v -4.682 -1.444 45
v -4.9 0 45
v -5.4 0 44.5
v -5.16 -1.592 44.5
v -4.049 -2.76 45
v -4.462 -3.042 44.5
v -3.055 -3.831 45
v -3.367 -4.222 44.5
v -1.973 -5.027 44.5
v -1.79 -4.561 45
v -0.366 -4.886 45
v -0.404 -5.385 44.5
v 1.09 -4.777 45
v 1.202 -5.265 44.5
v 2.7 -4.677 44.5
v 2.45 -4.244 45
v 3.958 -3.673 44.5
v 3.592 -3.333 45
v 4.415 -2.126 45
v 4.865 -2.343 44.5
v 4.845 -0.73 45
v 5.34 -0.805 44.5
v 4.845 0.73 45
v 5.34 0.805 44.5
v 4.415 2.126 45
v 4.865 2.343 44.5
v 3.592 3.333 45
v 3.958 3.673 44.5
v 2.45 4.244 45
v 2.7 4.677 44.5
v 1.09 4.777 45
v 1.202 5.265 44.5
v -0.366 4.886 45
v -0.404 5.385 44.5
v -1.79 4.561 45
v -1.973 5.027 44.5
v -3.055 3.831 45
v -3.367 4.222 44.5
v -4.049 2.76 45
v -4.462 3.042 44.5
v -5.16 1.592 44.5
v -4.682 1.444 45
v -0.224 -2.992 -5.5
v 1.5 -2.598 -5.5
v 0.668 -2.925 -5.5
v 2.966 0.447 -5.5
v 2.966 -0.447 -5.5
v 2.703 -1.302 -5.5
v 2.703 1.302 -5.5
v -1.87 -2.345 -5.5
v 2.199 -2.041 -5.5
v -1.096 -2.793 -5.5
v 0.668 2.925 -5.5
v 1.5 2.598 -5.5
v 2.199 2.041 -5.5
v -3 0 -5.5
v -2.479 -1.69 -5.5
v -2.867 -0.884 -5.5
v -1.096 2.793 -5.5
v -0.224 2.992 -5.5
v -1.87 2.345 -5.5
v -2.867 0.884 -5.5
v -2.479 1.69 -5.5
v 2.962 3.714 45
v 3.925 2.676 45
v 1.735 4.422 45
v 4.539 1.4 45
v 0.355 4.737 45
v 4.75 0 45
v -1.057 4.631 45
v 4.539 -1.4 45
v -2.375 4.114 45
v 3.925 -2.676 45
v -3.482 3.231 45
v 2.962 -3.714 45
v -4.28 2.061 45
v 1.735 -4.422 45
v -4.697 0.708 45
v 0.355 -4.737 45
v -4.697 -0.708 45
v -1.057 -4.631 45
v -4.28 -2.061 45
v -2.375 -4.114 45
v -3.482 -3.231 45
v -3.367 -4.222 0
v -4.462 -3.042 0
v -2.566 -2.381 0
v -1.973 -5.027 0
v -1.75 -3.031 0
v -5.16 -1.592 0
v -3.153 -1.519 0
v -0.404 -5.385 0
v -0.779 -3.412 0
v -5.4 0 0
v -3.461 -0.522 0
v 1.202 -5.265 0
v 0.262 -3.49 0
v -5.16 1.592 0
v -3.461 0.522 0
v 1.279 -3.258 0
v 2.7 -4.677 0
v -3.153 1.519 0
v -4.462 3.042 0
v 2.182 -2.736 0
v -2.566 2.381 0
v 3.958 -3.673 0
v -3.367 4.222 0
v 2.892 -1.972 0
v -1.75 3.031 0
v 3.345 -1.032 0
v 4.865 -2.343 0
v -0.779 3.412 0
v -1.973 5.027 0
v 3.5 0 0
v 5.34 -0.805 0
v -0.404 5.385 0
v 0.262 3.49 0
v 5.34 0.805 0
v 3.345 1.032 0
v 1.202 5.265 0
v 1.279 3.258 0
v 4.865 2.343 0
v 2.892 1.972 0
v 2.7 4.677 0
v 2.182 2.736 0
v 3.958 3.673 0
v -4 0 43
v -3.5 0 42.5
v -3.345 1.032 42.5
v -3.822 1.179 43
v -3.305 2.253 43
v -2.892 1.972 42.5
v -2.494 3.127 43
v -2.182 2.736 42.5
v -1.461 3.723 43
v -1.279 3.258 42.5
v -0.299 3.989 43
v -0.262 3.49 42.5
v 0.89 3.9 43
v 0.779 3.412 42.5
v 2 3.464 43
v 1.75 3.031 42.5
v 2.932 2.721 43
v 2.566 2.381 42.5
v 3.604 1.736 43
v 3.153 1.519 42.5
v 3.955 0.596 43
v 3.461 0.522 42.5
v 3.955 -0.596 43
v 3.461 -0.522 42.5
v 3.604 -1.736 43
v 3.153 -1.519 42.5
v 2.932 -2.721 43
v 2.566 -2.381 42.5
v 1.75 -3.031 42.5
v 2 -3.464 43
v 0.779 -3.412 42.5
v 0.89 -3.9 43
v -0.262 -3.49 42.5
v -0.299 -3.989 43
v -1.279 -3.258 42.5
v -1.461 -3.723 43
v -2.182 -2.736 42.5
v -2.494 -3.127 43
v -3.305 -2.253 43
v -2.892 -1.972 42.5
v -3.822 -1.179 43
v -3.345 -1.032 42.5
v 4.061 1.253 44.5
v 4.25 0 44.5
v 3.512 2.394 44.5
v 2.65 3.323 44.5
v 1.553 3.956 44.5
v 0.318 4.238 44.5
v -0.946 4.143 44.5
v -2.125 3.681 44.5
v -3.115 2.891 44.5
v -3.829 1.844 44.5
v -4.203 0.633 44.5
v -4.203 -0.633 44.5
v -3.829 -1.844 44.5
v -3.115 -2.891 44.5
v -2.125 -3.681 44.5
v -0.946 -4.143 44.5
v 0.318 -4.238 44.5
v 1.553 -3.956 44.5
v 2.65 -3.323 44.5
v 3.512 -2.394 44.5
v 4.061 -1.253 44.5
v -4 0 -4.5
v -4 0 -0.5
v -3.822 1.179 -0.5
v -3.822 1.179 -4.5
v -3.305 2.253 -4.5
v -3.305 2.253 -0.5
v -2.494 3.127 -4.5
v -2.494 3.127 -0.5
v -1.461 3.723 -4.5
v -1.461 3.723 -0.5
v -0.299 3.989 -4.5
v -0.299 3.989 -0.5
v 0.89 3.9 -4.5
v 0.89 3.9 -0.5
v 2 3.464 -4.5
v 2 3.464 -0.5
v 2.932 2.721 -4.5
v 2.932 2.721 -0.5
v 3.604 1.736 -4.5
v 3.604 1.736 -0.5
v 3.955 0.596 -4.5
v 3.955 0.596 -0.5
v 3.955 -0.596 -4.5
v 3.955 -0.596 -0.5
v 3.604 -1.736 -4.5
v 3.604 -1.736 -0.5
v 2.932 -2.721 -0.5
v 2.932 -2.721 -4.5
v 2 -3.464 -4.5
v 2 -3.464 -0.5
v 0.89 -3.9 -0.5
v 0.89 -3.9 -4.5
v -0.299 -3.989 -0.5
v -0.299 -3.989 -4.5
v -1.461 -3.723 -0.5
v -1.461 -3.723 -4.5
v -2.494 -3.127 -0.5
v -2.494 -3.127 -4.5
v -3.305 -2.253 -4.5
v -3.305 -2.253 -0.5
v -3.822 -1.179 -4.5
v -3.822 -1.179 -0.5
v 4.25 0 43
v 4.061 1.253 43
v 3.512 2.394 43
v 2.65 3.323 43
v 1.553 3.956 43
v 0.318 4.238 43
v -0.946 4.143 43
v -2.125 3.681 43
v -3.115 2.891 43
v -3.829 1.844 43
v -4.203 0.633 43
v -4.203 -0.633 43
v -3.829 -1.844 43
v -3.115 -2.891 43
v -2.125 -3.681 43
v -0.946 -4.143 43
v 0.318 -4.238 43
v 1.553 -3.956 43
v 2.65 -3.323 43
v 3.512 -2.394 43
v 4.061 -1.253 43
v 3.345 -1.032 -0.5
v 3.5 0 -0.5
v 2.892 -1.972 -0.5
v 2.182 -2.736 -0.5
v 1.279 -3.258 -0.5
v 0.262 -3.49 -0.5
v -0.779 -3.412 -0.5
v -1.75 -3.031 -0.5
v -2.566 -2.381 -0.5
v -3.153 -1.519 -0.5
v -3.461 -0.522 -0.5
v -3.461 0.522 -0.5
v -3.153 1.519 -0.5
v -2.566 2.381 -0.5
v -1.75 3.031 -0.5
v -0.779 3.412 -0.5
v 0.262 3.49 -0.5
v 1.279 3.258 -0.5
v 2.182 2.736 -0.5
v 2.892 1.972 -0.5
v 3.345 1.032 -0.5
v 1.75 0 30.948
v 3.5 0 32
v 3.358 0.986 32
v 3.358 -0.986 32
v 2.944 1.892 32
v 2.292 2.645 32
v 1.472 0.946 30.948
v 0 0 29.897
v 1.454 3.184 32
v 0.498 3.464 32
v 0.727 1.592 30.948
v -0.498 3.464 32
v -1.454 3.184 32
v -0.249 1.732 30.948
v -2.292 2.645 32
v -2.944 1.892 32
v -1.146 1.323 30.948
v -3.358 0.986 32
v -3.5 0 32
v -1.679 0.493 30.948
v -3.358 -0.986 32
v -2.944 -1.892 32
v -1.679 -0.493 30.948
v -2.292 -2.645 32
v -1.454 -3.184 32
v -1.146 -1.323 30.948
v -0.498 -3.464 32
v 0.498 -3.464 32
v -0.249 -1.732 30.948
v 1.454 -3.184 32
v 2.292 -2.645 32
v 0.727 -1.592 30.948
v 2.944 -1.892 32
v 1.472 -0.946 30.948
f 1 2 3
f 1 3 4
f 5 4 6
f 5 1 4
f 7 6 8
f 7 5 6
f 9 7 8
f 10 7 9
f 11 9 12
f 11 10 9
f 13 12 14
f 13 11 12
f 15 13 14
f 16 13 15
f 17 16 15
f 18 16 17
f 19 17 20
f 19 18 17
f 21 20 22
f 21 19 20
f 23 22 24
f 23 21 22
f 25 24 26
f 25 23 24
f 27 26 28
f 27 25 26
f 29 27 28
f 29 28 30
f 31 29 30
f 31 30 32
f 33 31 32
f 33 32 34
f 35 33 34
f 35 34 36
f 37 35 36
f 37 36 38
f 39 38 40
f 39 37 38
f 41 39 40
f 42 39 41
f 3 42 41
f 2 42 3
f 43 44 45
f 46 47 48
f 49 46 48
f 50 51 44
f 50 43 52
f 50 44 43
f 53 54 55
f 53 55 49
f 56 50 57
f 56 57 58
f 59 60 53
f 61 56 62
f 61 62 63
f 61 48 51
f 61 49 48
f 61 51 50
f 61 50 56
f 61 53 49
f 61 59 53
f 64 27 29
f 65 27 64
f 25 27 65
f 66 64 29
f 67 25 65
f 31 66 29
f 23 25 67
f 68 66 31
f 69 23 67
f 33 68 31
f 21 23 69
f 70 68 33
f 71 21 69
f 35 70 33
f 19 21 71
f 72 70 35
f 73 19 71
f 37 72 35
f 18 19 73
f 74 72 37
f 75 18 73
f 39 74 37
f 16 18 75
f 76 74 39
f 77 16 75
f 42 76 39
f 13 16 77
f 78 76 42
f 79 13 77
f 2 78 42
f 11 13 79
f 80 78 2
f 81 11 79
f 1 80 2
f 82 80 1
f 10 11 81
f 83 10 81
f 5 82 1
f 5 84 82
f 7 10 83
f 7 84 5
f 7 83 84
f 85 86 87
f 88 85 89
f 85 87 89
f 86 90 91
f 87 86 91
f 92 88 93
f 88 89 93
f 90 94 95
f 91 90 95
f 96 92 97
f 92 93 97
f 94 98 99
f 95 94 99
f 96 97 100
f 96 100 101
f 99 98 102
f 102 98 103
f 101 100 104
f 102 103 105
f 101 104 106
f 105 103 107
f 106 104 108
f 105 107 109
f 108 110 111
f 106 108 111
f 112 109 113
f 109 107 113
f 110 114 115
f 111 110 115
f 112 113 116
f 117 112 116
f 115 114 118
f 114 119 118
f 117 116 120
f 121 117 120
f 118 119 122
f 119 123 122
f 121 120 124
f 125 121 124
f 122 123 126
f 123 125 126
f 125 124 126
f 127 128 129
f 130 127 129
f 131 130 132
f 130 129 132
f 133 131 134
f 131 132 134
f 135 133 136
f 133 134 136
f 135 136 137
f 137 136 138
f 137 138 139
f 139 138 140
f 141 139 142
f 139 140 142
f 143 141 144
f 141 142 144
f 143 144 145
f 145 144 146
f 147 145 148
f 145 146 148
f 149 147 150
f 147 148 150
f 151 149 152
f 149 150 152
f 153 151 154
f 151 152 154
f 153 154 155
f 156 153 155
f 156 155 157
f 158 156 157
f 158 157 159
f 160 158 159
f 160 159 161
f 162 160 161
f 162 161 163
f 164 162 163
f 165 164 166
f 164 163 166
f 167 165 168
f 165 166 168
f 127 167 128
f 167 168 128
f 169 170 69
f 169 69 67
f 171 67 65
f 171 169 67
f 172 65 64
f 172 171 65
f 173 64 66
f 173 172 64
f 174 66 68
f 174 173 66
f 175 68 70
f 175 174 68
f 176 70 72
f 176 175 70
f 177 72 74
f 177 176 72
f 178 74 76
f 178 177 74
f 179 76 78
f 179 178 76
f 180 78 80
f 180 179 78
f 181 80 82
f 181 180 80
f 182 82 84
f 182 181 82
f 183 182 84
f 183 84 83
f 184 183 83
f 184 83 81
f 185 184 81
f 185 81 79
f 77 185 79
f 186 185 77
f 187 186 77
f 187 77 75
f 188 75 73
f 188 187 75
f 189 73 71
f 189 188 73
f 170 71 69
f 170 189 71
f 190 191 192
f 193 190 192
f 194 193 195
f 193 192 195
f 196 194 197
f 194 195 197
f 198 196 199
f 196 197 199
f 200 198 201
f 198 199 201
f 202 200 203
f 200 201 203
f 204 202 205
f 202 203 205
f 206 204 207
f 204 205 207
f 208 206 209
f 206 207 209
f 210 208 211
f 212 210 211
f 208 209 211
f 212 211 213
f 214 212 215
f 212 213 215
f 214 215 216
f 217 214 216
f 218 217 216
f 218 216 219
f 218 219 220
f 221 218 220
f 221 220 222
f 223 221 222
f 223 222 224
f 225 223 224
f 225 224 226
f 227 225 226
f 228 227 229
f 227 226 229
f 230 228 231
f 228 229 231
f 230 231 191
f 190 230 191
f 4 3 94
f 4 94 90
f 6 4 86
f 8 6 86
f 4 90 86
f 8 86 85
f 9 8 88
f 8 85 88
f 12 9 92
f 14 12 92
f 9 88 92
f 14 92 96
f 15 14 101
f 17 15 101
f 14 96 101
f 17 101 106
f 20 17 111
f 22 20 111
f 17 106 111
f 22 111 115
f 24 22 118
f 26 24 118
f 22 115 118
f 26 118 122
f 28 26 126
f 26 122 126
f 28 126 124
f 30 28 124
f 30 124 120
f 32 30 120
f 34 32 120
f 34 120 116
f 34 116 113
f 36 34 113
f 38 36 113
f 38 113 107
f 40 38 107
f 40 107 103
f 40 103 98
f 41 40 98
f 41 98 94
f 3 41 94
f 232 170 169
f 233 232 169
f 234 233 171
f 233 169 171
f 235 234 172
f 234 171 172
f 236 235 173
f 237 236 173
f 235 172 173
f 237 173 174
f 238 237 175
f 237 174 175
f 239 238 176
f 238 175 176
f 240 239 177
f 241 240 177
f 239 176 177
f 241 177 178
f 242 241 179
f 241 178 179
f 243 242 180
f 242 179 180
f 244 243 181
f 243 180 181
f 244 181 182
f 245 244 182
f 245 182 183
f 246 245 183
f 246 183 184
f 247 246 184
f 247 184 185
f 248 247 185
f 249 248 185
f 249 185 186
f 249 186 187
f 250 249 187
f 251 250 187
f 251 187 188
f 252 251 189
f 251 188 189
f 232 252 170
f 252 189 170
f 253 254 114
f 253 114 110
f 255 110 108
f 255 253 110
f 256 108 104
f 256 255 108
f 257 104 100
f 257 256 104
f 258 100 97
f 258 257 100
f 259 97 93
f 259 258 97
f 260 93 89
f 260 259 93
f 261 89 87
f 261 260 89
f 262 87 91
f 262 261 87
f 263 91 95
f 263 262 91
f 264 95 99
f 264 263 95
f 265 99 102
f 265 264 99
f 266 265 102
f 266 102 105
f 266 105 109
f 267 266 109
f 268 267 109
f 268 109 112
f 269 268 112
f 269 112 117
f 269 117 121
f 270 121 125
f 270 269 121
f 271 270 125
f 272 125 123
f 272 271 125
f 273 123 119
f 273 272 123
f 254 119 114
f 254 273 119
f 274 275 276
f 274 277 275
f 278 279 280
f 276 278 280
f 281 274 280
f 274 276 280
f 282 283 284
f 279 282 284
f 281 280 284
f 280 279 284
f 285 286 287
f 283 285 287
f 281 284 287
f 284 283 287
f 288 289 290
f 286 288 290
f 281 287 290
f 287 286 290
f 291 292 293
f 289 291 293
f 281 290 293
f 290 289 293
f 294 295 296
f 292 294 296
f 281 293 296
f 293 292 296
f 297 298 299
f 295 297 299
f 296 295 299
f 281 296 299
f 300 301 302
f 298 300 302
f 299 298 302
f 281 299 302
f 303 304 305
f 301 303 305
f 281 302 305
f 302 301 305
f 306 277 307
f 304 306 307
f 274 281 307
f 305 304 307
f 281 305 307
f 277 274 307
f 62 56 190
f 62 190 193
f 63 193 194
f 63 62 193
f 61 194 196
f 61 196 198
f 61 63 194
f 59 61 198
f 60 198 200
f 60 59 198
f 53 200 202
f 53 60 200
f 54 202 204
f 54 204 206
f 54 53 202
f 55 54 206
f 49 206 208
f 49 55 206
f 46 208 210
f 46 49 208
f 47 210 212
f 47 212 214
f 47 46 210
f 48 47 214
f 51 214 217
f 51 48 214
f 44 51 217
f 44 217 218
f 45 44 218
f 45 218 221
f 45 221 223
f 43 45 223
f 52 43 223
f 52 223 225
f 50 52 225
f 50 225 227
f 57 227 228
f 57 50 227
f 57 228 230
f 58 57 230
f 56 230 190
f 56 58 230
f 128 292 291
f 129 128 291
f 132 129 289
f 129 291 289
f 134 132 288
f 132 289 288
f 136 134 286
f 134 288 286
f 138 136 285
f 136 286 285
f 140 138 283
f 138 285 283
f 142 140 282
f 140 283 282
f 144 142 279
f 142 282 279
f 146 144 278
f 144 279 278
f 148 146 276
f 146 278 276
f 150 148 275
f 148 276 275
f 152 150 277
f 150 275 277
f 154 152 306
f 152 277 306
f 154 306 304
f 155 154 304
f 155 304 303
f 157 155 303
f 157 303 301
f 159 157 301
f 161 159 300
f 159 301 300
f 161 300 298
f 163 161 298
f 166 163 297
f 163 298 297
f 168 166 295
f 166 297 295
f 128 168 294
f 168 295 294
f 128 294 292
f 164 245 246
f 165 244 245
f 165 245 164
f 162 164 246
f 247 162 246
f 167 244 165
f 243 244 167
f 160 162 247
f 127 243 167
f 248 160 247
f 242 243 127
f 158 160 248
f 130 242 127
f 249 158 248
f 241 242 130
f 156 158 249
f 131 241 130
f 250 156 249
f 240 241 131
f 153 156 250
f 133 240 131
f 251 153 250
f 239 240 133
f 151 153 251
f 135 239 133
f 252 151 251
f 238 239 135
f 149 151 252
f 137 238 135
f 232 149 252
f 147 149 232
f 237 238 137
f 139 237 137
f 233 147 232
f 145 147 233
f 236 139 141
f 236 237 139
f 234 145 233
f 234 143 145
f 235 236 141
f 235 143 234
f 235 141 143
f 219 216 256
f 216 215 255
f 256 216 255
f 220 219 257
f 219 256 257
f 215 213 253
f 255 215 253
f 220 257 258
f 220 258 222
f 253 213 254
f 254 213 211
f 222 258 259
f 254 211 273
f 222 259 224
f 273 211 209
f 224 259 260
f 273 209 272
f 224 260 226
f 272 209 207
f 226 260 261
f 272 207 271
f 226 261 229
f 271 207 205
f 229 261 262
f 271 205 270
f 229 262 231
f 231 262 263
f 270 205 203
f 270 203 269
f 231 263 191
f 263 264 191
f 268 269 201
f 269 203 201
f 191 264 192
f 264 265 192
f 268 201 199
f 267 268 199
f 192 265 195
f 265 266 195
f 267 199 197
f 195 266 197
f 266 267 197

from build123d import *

# Parameters (mm, degrees)
SKETCH_1_R                = 5.4
EXTRUDE_1_DEPTH           = 45
EXTRUDE_3_DEPTH           = 5.4
M8X1_0_TAPPED_HOLE1_D     = 7
M8X1_0_TAPPED_HOLE1_DEPTH = 13
M8X1_0_TAPPED_HOLE1_TIP   = 2.103012167
M3_TAPPED_HOLE1_D         = 2.5
M3_TAPPED_HOLE1_DEPTH     = 7.5
M3_TAPPED_HOLE1_TIP       = 0.751075774
CHAMFER_1_SIZE            = 0.5
CHAMFER_2_SIZE            = 0.5
SKETCH_9_R                = 4.25
CUT_EXTRUDE_5_DEPTH       = 2
CHAMFER_3_SIZE            = 0.5
SKETCH_10_W               = 90.830281396
SKETCH_10_H               = 34.560289278
CUT_EXTRUDE_1_DEPTH       = 85
EXTRUDE_START             = 0.5
SKETCH_11_R               = 3.5
EXTRUDE_1_2_DEPTH         = 0.5
SKETCH_12_R               = 4
EXTRUDE_2_DEPTH           = 5
CHAMFER_4_SIZE            = 1


with BuildPart() as part:
    # 草图1 → Extrude 1 (new body)
    with BuildSketch(Plane.XY):
        with Locations(Location((0, 0, 0), (0, 0, 180))):
            Circle(SKETCH_1_R)
    extrude(amount=EXTRUDE_1_DEPTH)

    # 草图4 → 拉伸3 (add, symmetric)
    with BuildSketch(Plane.XZ):
        with BuildLine():
            Line((-22, 0), (22, 0))
            Line((22, 0), (28, -15.05119142))
            ThreePointArc((28, -15.05119142), (0, -12), (-28, -15.05119142))
            Line((-28, -15.05119142), (-22, 0))
        make_face()
    extrude(amount=EXTRUDE_3_DEPTH, both=True)

    # M8x1.0 Tapped Hole1
    with Locations(Plane.XY.offset(45)):
        with Locations((0, 0)):
            Hole(M8X1_0_TAPPED_HOLE1_D / 2, depth=M8X1_0_TAPPED_HOLE1_DEPTH)
            with Locations((0, 0, -(M8X1_0_TAPPED_HOLE1_DEPTH + M8X1_0_TAPPED_HOLE1_TIP / 2))):  # 118° drill point
                Cone(0, M8X1_0_TAPPED_HOLE1_D / 2, M8X1_0_TAPPED_HOLE1_TIP, mode=Mode.SUBTRACT)

    # M3 Tapped Hole1
    with Locations(Plane(origin=(-19.5, -1.4, 0), x_dir=(0, 1, 0), z_dir=(0, 0, 1))):
        with Locations((0, 0), (0, -39)):
            Hole(M3_TAPPED_HOLE1_D / 2, depth=M3_TAPPED_HOLE1_DEPTH)
            with Locations((0, 0, -(M3_TAPPED_HOLE1_DEPTH + M3_TAPPED_HOLE1_TIP / 2))):  # 118° drill point
                Cone(0, M3_TAPPED_HOLE1_D / 2, M3_TAPPED_HOLE1_TIP, mode=Mode.SUBTRACT)

    # 倒角1
    chamfer_1_edges = [part.edges().sort_by_distance(p)[0] for p in [
        (19.5, -0.15, 0),
        (-19.5, -0.15, 0),
    ]]
    chamfer(chamfer_1_edges, length=CHAMFER_1_SIZE)

    # 倒角2
    chamfer_2_edges = [part.edges().sort_by_distance(p)[0] for p in [
        (5.4, 0, 45),
    ]]
    chamfer(chamfer_2_edges, length=CHAMFER_2_SIZE)

    # 草图9 → 拉伸5 (cut)
    with BuildSketch(Plane.XY.offset(45)):
        Circle(SKETCH_9_R)
    extrude(amount=-CUT_EXTRUDE_5_DEPTH, mode=Mode.SUBTRACT)

    # 倒角3
    chamfer_3_edges = [part.edges().sort_by_distance(p)[0] for p in [
        (-4.25, 0, 45),
        (3.5, 0, 43),
    ]]
    chamfer(chamfer_3_edges, length=CHAMFER_3_SIZE)

    # 草图10 → 切除-拉伸1 (cut)
    with BuildSketch(Plane.XY):
        Rectangle(SKETCH_10_W, SKETCH_10_H)
    extrude(amount=-CUT_EXTRUDE_1_DEPTH, mode=Mode.SUBTRACT)

    # 草图11 → Extrude 1 2 (add)
    with BuildSketch(Plane(origin=(0, 0, 0), x_dir=(-1, 0, 0), z_dir=(0, 0, -1)).offset(EXTRUDE_START)):
        with Locations(Location((0, 0, 0), (0, 0, 180))):
            Circle(SKETCH_11_R)
    extrude(amount=-EXTRUDE_1_2_DEPTH)

    # 草图12 → 凸台-拉伸2 (add)
    with BuildSketch(Plane(origin=(0, 0, -0.5), x_dir=(-1, 0, 0), z_dir=(0, 0, -1))):
        Circle(SKETCH_12_R)
    extrude(amount=EXTRUDE_2_DEPTH)

    # 倒角4
    chamfer_4_edges = [part.edges().sort_by_distance(p)[0] for p in [
        (4, 0, -5.5),
    ]]
    chamfer(chamfer_4_edges, length=CHAMFER_4_SIZE)


solid = part.part
